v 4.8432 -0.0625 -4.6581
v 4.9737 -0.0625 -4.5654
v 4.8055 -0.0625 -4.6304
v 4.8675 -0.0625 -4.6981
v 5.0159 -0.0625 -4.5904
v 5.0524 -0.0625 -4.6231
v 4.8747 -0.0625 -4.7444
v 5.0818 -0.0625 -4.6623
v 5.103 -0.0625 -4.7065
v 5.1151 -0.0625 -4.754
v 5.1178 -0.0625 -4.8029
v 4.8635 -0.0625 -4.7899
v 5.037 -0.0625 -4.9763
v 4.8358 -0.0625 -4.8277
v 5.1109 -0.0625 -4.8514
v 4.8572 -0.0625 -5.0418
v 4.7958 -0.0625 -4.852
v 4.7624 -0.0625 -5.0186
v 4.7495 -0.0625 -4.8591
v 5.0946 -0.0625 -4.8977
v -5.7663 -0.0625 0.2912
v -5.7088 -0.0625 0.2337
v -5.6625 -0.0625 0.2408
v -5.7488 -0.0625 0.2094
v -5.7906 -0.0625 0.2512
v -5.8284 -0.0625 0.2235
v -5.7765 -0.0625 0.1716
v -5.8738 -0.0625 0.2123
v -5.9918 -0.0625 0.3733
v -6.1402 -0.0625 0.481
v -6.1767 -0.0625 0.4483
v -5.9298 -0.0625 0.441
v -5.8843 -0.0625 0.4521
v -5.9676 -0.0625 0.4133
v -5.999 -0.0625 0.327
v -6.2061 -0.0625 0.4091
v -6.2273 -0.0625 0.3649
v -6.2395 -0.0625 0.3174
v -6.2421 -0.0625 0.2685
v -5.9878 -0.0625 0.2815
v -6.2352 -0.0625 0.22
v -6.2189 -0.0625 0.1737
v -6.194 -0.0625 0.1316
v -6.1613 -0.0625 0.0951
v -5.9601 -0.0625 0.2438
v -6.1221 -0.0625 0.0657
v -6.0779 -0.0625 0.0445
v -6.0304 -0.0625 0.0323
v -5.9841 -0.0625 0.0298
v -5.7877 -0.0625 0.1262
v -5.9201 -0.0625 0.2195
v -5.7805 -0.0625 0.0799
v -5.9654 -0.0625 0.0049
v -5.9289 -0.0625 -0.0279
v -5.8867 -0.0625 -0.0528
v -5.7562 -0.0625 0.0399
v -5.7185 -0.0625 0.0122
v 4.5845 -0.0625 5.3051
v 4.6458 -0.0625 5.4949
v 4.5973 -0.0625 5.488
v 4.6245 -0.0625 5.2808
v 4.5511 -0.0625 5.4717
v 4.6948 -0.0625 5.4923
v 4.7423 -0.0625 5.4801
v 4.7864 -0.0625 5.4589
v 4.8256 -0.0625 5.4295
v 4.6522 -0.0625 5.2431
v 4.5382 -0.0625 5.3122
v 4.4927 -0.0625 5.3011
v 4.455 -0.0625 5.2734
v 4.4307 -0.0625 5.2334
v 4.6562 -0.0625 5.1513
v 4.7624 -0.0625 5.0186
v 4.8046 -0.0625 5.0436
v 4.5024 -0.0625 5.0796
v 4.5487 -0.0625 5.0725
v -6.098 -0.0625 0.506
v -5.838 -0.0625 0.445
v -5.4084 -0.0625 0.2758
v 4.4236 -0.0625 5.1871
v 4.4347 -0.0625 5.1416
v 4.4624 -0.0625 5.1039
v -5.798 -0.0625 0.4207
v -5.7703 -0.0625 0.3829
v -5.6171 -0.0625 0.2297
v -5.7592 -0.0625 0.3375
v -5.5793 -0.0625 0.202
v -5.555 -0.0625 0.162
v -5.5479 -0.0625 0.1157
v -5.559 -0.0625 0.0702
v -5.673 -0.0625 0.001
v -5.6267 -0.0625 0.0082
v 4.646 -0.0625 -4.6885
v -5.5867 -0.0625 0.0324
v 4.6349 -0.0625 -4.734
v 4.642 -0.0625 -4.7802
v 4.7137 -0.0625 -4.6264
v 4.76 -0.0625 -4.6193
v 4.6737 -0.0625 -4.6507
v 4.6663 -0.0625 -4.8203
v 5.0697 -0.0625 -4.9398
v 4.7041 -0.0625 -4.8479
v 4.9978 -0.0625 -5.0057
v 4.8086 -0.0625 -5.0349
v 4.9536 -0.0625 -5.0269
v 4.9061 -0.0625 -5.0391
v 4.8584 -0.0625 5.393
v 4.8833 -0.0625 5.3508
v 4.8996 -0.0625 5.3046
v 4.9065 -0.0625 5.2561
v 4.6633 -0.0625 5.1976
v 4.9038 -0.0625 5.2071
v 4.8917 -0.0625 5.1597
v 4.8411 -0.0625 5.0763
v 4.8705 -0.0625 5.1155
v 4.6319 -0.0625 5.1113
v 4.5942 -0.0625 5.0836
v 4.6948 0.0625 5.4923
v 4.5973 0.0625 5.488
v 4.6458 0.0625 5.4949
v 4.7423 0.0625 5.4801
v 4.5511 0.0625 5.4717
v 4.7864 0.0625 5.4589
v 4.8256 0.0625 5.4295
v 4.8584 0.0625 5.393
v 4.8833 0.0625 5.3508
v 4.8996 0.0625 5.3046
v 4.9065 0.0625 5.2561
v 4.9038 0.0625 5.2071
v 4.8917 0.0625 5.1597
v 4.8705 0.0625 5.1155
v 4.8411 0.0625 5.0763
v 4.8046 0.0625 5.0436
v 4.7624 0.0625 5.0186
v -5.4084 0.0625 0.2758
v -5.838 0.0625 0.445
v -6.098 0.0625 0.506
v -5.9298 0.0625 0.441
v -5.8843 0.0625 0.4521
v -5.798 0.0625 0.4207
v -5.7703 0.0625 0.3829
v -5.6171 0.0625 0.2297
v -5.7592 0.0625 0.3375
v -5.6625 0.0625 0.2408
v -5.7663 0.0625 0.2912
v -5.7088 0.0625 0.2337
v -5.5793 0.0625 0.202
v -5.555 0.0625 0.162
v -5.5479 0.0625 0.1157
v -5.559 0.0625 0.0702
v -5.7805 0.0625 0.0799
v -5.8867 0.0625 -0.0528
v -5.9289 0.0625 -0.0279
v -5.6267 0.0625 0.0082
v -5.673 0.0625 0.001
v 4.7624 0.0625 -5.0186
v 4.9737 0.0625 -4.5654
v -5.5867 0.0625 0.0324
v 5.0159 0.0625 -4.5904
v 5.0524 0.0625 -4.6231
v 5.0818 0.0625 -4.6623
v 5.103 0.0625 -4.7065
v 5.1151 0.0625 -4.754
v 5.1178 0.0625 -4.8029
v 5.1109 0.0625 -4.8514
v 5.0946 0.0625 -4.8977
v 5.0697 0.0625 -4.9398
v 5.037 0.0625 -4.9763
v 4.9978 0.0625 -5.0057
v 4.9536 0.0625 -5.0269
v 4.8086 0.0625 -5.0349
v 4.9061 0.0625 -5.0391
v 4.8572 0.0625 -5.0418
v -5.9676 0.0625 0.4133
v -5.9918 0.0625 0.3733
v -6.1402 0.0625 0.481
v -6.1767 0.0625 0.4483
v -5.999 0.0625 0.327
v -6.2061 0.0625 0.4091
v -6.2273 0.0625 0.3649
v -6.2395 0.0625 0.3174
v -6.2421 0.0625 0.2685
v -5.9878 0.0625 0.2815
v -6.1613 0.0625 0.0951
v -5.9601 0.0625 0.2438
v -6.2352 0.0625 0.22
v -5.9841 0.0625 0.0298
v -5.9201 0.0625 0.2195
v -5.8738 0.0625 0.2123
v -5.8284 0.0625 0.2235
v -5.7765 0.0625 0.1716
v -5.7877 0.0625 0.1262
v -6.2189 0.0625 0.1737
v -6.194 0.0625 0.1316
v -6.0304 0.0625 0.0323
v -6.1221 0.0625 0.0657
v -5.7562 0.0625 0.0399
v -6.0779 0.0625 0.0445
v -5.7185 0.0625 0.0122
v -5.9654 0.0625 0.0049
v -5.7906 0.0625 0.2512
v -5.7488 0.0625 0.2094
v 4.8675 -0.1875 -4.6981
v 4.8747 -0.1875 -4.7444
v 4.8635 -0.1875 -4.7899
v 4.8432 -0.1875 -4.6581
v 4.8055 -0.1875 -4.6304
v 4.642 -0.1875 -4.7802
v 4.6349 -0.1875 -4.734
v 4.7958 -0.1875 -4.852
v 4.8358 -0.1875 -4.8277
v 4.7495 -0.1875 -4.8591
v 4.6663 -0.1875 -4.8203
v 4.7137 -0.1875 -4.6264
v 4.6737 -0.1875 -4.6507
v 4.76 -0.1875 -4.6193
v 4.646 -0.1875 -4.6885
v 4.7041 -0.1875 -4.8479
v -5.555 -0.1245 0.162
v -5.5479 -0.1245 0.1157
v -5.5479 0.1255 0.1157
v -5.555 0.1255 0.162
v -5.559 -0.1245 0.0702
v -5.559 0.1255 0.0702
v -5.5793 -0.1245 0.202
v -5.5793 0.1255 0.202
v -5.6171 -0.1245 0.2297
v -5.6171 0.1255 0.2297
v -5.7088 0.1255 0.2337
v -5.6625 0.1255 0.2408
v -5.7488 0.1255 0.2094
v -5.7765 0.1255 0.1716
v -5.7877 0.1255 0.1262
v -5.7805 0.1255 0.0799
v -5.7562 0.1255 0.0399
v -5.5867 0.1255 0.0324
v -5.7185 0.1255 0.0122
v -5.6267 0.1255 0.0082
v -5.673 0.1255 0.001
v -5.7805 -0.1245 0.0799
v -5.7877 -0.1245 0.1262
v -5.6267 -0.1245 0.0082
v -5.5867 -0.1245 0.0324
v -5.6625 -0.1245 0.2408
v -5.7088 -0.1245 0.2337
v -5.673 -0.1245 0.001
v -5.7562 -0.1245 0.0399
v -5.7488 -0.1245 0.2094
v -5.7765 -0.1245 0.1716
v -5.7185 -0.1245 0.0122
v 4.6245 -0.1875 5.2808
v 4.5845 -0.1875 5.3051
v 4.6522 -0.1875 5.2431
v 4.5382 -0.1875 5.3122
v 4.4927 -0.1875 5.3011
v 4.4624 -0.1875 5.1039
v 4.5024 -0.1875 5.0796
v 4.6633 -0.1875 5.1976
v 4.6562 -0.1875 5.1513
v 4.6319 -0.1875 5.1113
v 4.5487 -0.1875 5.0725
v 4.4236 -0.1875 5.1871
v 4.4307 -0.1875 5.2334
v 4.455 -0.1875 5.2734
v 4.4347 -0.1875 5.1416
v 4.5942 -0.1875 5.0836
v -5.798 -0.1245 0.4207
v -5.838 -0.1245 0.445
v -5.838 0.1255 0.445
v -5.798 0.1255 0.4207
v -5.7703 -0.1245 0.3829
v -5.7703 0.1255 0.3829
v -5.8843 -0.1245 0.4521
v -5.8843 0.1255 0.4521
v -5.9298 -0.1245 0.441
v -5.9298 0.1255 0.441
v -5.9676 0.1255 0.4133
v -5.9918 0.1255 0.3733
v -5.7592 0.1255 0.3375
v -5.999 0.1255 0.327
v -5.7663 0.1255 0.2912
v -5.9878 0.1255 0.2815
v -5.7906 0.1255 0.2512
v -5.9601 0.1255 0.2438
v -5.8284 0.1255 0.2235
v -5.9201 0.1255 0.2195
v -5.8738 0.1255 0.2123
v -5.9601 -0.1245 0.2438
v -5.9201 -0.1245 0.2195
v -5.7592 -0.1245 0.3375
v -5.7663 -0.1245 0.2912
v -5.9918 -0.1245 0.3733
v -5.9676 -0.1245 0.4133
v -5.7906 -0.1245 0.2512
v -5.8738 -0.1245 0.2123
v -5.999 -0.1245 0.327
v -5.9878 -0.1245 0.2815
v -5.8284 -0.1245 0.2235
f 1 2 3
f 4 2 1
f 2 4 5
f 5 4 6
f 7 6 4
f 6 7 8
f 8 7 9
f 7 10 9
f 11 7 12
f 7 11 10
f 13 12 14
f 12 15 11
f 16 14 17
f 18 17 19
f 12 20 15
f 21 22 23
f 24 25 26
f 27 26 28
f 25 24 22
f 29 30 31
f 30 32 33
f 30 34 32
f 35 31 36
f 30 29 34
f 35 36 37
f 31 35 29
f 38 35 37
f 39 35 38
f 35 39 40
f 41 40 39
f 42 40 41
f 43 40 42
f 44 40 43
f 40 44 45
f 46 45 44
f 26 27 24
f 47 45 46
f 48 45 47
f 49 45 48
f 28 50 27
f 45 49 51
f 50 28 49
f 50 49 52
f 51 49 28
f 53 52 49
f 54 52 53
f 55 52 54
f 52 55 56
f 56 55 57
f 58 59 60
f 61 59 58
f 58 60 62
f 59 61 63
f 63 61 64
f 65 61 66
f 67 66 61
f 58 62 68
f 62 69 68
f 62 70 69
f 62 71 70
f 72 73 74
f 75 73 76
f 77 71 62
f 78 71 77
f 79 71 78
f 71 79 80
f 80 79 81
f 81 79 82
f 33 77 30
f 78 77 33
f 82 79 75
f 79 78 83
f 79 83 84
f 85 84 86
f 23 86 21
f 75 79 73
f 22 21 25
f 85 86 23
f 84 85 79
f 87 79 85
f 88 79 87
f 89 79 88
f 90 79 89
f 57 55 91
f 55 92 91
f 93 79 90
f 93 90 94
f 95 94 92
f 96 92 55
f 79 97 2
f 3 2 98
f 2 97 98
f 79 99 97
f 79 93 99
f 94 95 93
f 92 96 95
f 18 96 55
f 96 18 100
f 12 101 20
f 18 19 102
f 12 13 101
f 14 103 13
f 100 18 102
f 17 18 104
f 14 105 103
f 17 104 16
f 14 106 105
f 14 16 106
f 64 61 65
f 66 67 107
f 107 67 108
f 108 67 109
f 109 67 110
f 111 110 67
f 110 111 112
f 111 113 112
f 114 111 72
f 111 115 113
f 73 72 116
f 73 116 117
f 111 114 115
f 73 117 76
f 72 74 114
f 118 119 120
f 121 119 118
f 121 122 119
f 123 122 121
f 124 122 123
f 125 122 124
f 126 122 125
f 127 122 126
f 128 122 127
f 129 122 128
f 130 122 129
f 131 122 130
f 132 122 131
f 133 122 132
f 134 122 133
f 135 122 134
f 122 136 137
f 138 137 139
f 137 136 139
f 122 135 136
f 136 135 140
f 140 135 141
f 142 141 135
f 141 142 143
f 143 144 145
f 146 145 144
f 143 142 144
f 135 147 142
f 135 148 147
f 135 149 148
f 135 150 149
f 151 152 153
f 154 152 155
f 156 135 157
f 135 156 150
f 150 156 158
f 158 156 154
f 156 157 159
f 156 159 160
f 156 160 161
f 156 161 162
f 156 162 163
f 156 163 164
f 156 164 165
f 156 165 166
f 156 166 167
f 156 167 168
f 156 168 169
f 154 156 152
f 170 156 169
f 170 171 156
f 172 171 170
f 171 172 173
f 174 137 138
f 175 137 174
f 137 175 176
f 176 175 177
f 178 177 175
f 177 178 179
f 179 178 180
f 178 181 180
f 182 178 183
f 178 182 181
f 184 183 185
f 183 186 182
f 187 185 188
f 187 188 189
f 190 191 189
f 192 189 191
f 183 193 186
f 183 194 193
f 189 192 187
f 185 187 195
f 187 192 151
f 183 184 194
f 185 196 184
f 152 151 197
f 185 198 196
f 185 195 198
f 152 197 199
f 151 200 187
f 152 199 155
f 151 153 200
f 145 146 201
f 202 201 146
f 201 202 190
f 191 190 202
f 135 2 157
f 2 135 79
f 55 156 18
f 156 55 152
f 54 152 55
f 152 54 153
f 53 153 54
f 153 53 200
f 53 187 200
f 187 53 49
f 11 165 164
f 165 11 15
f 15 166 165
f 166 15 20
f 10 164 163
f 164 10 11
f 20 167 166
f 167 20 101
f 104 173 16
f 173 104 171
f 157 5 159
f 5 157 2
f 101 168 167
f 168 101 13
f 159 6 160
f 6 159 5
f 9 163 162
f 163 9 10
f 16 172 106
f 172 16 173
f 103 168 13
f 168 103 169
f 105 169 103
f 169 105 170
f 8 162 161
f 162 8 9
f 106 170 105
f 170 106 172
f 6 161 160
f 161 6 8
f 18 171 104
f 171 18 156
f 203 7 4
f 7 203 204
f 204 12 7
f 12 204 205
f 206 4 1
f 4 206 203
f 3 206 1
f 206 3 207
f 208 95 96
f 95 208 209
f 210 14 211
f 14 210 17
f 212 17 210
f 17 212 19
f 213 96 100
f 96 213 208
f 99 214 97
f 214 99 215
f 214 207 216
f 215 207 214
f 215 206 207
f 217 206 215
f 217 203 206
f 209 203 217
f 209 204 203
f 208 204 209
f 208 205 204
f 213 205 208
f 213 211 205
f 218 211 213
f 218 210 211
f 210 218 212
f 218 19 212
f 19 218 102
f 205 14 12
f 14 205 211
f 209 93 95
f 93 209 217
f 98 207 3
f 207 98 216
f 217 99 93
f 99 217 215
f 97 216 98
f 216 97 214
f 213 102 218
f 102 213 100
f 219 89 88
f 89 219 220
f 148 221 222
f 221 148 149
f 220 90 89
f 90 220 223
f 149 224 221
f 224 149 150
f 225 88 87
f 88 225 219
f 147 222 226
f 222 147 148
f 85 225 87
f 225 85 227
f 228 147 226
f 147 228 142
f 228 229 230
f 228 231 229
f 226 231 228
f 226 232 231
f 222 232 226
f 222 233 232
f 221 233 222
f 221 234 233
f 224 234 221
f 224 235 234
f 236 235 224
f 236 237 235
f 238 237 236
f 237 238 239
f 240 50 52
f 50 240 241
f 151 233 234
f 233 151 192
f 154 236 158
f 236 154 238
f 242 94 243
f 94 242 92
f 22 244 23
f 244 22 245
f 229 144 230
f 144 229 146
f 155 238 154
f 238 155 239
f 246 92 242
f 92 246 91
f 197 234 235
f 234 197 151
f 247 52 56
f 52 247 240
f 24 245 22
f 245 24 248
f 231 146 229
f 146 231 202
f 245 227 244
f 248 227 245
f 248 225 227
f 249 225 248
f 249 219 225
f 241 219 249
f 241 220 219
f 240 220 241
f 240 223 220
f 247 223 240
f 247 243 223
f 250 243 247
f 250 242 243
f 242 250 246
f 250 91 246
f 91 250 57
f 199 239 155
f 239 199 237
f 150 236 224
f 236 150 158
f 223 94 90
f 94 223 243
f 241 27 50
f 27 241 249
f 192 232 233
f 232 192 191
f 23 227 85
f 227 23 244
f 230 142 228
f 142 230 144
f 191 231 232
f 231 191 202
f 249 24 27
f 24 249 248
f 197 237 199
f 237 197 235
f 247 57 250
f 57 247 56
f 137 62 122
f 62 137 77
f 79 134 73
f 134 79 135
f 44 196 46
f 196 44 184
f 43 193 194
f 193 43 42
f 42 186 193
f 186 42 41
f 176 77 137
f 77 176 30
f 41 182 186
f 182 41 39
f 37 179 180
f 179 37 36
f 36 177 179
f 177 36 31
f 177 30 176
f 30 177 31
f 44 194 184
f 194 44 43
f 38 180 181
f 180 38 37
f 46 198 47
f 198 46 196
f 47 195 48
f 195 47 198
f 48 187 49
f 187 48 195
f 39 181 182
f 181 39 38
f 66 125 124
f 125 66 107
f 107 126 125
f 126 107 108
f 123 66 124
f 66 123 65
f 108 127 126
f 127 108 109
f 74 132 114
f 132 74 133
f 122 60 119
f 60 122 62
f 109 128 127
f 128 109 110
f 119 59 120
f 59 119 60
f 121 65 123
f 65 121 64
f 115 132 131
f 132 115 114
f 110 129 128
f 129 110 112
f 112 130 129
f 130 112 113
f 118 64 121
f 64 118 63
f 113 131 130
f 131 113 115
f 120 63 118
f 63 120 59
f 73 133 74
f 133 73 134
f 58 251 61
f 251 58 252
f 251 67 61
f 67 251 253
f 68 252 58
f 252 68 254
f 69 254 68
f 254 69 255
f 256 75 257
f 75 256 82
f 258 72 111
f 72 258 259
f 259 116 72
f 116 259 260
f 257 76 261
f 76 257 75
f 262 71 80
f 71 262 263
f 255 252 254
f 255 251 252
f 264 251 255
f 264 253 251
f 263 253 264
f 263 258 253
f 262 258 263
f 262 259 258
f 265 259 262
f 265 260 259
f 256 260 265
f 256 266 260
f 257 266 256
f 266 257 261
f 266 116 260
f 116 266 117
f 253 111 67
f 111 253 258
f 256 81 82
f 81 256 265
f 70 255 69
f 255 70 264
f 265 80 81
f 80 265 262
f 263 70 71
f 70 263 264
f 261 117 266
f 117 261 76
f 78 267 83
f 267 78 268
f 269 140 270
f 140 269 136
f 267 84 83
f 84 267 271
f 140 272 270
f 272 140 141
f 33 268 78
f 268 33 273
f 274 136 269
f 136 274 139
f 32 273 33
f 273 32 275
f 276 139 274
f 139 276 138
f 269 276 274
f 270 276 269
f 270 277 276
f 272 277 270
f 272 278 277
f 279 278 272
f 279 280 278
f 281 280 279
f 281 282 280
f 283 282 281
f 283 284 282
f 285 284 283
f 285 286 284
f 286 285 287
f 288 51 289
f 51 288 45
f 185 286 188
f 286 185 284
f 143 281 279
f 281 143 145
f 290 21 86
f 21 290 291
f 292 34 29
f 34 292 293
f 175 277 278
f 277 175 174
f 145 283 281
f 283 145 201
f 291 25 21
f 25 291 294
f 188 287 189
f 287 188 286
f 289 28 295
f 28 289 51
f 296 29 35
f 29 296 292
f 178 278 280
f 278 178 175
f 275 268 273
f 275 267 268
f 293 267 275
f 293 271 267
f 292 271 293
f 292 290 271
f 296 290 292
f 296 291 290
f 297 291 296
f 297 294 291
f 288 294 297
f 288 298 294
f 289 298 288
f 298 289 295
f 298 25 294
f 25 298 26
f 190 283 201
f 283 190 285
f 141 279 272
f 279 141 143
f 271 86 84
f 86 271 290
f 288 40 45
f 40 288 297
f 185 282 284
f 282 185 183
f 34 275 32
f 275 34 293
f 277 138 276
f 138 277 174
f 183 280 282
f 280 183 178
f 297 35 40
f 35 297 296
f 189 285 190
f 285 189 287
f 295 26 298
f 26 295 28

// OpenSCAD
// file: clevis.scad
use <linkage.scad>;

module clevis() {
    c_length = 1.25;
    c_width  = 0.5;
    c_height  = 0.5;
    c_slot = c_height/2; // width of the slot
    //  #8 screw radius .08
    difference() {
        cube( [c_length,c_width,c_height] );
        translate([0,0.0,c_slot/2]) cube( [c_length*.7,c_width,c_slot]);
        // the hinge holes
        translate( [.2,c_width/2,-.1] ) cylinder(r=.08, h=.70);
        // threaded rod hole
        translate( [0, c_width/2, c_height/2]) rotate([0,90,0]) cylinder(r=.08, h=c_length+.1);
    }
    // threaded rod hole
    //translate( [0, c_width/2, c_height/2]) rotate([0,90,0]) cylinder(r=.08, h=c_length+.1);
}
//[ 15.00, 3.95, -0.29 ]translate([0.25,3,0]) clevis();
//straight_link();
scale([25.4,25.4,25.4]) clevis();
// file: piston.scad
piston_dia = 1.5;
piston_cnt = 4;
piston_height=.5;
cylinder_height=3.25;

bottle_width = 4;
bottle_cnt = 4;
shelf_height=0.25;
bottle_padding=.5;
shelf_width = bottle_width+1;
//shelf_length = bottle_cnt*(bottle_width+1);
shelf_length= bottle_cnt *  (bottle_width+bottle_padding) + bottle_padding;

module bottle() {
    cylinder(r=bottle_width/2, h=8);
    translate( [0,0, 8]) cylinder(r1=2, r2=.7, h=4);
    translate( [0,0, 12]) cylinder(r=.7, h=1.5);
}

module bottle_shelf() {
    shelf_width = bottle_width+1;
    //shelf_length = bottle_cnt*(bottle_width+1);
    shelf_length= bottle_cnt *  (bottle_width+bottle_padding) + bottle_padding;
    
    cube( [shelf_length, shelf_width, shelf_height] );
}

module loaded_shelf() {
    for (i=[0:bottle_cnt-1]) {
        first_offset = bottle_width/2+bottle_padding;
        translate( [i* (bottle_width+bottle_padding) + bottle_width/2 + bottle_padding,    bottle_width/2+bottle_padding, 0]) bottle();
    }
    bottle_shelf();
}


use <clevis.scad>
module piston_cylinder() {
    cylinder(r=piston_dia/2, h=cylinder_height);
}
module piston() {
    // piston
    cylinder(r=(piston_dia/2)-.01, h=.5);
    // piston rod
    translate( [0,0,-5]) cylinder(r=.125, h=5);
    //clevis
    translate( [0.25,-.25,-6.25]) rotate([0,-90,0]) clevis();
}

module bottle_shelf() {
    
    cube( [shelf_length, shelf_width, shelf_height] );
}

module all_pistons() {
    for (i=[0:piston_cnt-1]) {
        first_offset = bottle_width/2+bottle_padding;
        translate( [i* (bottle_width+bottle_padding) + bottle_width/2 + bottle_padding,    bottle_width/2+bottle_padding, 0]) %piston_cylinder();
        
        *translate( [i* (bottle_width+bottle_padding) + bottle_width/2 + bottle_padding,    bottle_width/2+bottle_padding, cylinder_height/2]) piston();
    }
    // bottom cylinder plate
    translate( [ 0, 1.5, 0]) cube( [ shelf_length, 2, .25]);
    // top cylinder plate
    translate( [ 0, 1.5, cylinder_height]) cube( [ shelf_length, 2, .25]);

}


$fa=.5;
$fs=.5;
all_pistons();
//loaded_shelf();
// main file
use <linkage.scad>;

translate( [-6,0.0625,0] )
    rotate( [ 90, 25, 0] )        
        eccentric_link(12);

translate( [-6,0.0625,0] ) 
    rotate( [ 90, -25, 0] )
        eccentric_link(12);
